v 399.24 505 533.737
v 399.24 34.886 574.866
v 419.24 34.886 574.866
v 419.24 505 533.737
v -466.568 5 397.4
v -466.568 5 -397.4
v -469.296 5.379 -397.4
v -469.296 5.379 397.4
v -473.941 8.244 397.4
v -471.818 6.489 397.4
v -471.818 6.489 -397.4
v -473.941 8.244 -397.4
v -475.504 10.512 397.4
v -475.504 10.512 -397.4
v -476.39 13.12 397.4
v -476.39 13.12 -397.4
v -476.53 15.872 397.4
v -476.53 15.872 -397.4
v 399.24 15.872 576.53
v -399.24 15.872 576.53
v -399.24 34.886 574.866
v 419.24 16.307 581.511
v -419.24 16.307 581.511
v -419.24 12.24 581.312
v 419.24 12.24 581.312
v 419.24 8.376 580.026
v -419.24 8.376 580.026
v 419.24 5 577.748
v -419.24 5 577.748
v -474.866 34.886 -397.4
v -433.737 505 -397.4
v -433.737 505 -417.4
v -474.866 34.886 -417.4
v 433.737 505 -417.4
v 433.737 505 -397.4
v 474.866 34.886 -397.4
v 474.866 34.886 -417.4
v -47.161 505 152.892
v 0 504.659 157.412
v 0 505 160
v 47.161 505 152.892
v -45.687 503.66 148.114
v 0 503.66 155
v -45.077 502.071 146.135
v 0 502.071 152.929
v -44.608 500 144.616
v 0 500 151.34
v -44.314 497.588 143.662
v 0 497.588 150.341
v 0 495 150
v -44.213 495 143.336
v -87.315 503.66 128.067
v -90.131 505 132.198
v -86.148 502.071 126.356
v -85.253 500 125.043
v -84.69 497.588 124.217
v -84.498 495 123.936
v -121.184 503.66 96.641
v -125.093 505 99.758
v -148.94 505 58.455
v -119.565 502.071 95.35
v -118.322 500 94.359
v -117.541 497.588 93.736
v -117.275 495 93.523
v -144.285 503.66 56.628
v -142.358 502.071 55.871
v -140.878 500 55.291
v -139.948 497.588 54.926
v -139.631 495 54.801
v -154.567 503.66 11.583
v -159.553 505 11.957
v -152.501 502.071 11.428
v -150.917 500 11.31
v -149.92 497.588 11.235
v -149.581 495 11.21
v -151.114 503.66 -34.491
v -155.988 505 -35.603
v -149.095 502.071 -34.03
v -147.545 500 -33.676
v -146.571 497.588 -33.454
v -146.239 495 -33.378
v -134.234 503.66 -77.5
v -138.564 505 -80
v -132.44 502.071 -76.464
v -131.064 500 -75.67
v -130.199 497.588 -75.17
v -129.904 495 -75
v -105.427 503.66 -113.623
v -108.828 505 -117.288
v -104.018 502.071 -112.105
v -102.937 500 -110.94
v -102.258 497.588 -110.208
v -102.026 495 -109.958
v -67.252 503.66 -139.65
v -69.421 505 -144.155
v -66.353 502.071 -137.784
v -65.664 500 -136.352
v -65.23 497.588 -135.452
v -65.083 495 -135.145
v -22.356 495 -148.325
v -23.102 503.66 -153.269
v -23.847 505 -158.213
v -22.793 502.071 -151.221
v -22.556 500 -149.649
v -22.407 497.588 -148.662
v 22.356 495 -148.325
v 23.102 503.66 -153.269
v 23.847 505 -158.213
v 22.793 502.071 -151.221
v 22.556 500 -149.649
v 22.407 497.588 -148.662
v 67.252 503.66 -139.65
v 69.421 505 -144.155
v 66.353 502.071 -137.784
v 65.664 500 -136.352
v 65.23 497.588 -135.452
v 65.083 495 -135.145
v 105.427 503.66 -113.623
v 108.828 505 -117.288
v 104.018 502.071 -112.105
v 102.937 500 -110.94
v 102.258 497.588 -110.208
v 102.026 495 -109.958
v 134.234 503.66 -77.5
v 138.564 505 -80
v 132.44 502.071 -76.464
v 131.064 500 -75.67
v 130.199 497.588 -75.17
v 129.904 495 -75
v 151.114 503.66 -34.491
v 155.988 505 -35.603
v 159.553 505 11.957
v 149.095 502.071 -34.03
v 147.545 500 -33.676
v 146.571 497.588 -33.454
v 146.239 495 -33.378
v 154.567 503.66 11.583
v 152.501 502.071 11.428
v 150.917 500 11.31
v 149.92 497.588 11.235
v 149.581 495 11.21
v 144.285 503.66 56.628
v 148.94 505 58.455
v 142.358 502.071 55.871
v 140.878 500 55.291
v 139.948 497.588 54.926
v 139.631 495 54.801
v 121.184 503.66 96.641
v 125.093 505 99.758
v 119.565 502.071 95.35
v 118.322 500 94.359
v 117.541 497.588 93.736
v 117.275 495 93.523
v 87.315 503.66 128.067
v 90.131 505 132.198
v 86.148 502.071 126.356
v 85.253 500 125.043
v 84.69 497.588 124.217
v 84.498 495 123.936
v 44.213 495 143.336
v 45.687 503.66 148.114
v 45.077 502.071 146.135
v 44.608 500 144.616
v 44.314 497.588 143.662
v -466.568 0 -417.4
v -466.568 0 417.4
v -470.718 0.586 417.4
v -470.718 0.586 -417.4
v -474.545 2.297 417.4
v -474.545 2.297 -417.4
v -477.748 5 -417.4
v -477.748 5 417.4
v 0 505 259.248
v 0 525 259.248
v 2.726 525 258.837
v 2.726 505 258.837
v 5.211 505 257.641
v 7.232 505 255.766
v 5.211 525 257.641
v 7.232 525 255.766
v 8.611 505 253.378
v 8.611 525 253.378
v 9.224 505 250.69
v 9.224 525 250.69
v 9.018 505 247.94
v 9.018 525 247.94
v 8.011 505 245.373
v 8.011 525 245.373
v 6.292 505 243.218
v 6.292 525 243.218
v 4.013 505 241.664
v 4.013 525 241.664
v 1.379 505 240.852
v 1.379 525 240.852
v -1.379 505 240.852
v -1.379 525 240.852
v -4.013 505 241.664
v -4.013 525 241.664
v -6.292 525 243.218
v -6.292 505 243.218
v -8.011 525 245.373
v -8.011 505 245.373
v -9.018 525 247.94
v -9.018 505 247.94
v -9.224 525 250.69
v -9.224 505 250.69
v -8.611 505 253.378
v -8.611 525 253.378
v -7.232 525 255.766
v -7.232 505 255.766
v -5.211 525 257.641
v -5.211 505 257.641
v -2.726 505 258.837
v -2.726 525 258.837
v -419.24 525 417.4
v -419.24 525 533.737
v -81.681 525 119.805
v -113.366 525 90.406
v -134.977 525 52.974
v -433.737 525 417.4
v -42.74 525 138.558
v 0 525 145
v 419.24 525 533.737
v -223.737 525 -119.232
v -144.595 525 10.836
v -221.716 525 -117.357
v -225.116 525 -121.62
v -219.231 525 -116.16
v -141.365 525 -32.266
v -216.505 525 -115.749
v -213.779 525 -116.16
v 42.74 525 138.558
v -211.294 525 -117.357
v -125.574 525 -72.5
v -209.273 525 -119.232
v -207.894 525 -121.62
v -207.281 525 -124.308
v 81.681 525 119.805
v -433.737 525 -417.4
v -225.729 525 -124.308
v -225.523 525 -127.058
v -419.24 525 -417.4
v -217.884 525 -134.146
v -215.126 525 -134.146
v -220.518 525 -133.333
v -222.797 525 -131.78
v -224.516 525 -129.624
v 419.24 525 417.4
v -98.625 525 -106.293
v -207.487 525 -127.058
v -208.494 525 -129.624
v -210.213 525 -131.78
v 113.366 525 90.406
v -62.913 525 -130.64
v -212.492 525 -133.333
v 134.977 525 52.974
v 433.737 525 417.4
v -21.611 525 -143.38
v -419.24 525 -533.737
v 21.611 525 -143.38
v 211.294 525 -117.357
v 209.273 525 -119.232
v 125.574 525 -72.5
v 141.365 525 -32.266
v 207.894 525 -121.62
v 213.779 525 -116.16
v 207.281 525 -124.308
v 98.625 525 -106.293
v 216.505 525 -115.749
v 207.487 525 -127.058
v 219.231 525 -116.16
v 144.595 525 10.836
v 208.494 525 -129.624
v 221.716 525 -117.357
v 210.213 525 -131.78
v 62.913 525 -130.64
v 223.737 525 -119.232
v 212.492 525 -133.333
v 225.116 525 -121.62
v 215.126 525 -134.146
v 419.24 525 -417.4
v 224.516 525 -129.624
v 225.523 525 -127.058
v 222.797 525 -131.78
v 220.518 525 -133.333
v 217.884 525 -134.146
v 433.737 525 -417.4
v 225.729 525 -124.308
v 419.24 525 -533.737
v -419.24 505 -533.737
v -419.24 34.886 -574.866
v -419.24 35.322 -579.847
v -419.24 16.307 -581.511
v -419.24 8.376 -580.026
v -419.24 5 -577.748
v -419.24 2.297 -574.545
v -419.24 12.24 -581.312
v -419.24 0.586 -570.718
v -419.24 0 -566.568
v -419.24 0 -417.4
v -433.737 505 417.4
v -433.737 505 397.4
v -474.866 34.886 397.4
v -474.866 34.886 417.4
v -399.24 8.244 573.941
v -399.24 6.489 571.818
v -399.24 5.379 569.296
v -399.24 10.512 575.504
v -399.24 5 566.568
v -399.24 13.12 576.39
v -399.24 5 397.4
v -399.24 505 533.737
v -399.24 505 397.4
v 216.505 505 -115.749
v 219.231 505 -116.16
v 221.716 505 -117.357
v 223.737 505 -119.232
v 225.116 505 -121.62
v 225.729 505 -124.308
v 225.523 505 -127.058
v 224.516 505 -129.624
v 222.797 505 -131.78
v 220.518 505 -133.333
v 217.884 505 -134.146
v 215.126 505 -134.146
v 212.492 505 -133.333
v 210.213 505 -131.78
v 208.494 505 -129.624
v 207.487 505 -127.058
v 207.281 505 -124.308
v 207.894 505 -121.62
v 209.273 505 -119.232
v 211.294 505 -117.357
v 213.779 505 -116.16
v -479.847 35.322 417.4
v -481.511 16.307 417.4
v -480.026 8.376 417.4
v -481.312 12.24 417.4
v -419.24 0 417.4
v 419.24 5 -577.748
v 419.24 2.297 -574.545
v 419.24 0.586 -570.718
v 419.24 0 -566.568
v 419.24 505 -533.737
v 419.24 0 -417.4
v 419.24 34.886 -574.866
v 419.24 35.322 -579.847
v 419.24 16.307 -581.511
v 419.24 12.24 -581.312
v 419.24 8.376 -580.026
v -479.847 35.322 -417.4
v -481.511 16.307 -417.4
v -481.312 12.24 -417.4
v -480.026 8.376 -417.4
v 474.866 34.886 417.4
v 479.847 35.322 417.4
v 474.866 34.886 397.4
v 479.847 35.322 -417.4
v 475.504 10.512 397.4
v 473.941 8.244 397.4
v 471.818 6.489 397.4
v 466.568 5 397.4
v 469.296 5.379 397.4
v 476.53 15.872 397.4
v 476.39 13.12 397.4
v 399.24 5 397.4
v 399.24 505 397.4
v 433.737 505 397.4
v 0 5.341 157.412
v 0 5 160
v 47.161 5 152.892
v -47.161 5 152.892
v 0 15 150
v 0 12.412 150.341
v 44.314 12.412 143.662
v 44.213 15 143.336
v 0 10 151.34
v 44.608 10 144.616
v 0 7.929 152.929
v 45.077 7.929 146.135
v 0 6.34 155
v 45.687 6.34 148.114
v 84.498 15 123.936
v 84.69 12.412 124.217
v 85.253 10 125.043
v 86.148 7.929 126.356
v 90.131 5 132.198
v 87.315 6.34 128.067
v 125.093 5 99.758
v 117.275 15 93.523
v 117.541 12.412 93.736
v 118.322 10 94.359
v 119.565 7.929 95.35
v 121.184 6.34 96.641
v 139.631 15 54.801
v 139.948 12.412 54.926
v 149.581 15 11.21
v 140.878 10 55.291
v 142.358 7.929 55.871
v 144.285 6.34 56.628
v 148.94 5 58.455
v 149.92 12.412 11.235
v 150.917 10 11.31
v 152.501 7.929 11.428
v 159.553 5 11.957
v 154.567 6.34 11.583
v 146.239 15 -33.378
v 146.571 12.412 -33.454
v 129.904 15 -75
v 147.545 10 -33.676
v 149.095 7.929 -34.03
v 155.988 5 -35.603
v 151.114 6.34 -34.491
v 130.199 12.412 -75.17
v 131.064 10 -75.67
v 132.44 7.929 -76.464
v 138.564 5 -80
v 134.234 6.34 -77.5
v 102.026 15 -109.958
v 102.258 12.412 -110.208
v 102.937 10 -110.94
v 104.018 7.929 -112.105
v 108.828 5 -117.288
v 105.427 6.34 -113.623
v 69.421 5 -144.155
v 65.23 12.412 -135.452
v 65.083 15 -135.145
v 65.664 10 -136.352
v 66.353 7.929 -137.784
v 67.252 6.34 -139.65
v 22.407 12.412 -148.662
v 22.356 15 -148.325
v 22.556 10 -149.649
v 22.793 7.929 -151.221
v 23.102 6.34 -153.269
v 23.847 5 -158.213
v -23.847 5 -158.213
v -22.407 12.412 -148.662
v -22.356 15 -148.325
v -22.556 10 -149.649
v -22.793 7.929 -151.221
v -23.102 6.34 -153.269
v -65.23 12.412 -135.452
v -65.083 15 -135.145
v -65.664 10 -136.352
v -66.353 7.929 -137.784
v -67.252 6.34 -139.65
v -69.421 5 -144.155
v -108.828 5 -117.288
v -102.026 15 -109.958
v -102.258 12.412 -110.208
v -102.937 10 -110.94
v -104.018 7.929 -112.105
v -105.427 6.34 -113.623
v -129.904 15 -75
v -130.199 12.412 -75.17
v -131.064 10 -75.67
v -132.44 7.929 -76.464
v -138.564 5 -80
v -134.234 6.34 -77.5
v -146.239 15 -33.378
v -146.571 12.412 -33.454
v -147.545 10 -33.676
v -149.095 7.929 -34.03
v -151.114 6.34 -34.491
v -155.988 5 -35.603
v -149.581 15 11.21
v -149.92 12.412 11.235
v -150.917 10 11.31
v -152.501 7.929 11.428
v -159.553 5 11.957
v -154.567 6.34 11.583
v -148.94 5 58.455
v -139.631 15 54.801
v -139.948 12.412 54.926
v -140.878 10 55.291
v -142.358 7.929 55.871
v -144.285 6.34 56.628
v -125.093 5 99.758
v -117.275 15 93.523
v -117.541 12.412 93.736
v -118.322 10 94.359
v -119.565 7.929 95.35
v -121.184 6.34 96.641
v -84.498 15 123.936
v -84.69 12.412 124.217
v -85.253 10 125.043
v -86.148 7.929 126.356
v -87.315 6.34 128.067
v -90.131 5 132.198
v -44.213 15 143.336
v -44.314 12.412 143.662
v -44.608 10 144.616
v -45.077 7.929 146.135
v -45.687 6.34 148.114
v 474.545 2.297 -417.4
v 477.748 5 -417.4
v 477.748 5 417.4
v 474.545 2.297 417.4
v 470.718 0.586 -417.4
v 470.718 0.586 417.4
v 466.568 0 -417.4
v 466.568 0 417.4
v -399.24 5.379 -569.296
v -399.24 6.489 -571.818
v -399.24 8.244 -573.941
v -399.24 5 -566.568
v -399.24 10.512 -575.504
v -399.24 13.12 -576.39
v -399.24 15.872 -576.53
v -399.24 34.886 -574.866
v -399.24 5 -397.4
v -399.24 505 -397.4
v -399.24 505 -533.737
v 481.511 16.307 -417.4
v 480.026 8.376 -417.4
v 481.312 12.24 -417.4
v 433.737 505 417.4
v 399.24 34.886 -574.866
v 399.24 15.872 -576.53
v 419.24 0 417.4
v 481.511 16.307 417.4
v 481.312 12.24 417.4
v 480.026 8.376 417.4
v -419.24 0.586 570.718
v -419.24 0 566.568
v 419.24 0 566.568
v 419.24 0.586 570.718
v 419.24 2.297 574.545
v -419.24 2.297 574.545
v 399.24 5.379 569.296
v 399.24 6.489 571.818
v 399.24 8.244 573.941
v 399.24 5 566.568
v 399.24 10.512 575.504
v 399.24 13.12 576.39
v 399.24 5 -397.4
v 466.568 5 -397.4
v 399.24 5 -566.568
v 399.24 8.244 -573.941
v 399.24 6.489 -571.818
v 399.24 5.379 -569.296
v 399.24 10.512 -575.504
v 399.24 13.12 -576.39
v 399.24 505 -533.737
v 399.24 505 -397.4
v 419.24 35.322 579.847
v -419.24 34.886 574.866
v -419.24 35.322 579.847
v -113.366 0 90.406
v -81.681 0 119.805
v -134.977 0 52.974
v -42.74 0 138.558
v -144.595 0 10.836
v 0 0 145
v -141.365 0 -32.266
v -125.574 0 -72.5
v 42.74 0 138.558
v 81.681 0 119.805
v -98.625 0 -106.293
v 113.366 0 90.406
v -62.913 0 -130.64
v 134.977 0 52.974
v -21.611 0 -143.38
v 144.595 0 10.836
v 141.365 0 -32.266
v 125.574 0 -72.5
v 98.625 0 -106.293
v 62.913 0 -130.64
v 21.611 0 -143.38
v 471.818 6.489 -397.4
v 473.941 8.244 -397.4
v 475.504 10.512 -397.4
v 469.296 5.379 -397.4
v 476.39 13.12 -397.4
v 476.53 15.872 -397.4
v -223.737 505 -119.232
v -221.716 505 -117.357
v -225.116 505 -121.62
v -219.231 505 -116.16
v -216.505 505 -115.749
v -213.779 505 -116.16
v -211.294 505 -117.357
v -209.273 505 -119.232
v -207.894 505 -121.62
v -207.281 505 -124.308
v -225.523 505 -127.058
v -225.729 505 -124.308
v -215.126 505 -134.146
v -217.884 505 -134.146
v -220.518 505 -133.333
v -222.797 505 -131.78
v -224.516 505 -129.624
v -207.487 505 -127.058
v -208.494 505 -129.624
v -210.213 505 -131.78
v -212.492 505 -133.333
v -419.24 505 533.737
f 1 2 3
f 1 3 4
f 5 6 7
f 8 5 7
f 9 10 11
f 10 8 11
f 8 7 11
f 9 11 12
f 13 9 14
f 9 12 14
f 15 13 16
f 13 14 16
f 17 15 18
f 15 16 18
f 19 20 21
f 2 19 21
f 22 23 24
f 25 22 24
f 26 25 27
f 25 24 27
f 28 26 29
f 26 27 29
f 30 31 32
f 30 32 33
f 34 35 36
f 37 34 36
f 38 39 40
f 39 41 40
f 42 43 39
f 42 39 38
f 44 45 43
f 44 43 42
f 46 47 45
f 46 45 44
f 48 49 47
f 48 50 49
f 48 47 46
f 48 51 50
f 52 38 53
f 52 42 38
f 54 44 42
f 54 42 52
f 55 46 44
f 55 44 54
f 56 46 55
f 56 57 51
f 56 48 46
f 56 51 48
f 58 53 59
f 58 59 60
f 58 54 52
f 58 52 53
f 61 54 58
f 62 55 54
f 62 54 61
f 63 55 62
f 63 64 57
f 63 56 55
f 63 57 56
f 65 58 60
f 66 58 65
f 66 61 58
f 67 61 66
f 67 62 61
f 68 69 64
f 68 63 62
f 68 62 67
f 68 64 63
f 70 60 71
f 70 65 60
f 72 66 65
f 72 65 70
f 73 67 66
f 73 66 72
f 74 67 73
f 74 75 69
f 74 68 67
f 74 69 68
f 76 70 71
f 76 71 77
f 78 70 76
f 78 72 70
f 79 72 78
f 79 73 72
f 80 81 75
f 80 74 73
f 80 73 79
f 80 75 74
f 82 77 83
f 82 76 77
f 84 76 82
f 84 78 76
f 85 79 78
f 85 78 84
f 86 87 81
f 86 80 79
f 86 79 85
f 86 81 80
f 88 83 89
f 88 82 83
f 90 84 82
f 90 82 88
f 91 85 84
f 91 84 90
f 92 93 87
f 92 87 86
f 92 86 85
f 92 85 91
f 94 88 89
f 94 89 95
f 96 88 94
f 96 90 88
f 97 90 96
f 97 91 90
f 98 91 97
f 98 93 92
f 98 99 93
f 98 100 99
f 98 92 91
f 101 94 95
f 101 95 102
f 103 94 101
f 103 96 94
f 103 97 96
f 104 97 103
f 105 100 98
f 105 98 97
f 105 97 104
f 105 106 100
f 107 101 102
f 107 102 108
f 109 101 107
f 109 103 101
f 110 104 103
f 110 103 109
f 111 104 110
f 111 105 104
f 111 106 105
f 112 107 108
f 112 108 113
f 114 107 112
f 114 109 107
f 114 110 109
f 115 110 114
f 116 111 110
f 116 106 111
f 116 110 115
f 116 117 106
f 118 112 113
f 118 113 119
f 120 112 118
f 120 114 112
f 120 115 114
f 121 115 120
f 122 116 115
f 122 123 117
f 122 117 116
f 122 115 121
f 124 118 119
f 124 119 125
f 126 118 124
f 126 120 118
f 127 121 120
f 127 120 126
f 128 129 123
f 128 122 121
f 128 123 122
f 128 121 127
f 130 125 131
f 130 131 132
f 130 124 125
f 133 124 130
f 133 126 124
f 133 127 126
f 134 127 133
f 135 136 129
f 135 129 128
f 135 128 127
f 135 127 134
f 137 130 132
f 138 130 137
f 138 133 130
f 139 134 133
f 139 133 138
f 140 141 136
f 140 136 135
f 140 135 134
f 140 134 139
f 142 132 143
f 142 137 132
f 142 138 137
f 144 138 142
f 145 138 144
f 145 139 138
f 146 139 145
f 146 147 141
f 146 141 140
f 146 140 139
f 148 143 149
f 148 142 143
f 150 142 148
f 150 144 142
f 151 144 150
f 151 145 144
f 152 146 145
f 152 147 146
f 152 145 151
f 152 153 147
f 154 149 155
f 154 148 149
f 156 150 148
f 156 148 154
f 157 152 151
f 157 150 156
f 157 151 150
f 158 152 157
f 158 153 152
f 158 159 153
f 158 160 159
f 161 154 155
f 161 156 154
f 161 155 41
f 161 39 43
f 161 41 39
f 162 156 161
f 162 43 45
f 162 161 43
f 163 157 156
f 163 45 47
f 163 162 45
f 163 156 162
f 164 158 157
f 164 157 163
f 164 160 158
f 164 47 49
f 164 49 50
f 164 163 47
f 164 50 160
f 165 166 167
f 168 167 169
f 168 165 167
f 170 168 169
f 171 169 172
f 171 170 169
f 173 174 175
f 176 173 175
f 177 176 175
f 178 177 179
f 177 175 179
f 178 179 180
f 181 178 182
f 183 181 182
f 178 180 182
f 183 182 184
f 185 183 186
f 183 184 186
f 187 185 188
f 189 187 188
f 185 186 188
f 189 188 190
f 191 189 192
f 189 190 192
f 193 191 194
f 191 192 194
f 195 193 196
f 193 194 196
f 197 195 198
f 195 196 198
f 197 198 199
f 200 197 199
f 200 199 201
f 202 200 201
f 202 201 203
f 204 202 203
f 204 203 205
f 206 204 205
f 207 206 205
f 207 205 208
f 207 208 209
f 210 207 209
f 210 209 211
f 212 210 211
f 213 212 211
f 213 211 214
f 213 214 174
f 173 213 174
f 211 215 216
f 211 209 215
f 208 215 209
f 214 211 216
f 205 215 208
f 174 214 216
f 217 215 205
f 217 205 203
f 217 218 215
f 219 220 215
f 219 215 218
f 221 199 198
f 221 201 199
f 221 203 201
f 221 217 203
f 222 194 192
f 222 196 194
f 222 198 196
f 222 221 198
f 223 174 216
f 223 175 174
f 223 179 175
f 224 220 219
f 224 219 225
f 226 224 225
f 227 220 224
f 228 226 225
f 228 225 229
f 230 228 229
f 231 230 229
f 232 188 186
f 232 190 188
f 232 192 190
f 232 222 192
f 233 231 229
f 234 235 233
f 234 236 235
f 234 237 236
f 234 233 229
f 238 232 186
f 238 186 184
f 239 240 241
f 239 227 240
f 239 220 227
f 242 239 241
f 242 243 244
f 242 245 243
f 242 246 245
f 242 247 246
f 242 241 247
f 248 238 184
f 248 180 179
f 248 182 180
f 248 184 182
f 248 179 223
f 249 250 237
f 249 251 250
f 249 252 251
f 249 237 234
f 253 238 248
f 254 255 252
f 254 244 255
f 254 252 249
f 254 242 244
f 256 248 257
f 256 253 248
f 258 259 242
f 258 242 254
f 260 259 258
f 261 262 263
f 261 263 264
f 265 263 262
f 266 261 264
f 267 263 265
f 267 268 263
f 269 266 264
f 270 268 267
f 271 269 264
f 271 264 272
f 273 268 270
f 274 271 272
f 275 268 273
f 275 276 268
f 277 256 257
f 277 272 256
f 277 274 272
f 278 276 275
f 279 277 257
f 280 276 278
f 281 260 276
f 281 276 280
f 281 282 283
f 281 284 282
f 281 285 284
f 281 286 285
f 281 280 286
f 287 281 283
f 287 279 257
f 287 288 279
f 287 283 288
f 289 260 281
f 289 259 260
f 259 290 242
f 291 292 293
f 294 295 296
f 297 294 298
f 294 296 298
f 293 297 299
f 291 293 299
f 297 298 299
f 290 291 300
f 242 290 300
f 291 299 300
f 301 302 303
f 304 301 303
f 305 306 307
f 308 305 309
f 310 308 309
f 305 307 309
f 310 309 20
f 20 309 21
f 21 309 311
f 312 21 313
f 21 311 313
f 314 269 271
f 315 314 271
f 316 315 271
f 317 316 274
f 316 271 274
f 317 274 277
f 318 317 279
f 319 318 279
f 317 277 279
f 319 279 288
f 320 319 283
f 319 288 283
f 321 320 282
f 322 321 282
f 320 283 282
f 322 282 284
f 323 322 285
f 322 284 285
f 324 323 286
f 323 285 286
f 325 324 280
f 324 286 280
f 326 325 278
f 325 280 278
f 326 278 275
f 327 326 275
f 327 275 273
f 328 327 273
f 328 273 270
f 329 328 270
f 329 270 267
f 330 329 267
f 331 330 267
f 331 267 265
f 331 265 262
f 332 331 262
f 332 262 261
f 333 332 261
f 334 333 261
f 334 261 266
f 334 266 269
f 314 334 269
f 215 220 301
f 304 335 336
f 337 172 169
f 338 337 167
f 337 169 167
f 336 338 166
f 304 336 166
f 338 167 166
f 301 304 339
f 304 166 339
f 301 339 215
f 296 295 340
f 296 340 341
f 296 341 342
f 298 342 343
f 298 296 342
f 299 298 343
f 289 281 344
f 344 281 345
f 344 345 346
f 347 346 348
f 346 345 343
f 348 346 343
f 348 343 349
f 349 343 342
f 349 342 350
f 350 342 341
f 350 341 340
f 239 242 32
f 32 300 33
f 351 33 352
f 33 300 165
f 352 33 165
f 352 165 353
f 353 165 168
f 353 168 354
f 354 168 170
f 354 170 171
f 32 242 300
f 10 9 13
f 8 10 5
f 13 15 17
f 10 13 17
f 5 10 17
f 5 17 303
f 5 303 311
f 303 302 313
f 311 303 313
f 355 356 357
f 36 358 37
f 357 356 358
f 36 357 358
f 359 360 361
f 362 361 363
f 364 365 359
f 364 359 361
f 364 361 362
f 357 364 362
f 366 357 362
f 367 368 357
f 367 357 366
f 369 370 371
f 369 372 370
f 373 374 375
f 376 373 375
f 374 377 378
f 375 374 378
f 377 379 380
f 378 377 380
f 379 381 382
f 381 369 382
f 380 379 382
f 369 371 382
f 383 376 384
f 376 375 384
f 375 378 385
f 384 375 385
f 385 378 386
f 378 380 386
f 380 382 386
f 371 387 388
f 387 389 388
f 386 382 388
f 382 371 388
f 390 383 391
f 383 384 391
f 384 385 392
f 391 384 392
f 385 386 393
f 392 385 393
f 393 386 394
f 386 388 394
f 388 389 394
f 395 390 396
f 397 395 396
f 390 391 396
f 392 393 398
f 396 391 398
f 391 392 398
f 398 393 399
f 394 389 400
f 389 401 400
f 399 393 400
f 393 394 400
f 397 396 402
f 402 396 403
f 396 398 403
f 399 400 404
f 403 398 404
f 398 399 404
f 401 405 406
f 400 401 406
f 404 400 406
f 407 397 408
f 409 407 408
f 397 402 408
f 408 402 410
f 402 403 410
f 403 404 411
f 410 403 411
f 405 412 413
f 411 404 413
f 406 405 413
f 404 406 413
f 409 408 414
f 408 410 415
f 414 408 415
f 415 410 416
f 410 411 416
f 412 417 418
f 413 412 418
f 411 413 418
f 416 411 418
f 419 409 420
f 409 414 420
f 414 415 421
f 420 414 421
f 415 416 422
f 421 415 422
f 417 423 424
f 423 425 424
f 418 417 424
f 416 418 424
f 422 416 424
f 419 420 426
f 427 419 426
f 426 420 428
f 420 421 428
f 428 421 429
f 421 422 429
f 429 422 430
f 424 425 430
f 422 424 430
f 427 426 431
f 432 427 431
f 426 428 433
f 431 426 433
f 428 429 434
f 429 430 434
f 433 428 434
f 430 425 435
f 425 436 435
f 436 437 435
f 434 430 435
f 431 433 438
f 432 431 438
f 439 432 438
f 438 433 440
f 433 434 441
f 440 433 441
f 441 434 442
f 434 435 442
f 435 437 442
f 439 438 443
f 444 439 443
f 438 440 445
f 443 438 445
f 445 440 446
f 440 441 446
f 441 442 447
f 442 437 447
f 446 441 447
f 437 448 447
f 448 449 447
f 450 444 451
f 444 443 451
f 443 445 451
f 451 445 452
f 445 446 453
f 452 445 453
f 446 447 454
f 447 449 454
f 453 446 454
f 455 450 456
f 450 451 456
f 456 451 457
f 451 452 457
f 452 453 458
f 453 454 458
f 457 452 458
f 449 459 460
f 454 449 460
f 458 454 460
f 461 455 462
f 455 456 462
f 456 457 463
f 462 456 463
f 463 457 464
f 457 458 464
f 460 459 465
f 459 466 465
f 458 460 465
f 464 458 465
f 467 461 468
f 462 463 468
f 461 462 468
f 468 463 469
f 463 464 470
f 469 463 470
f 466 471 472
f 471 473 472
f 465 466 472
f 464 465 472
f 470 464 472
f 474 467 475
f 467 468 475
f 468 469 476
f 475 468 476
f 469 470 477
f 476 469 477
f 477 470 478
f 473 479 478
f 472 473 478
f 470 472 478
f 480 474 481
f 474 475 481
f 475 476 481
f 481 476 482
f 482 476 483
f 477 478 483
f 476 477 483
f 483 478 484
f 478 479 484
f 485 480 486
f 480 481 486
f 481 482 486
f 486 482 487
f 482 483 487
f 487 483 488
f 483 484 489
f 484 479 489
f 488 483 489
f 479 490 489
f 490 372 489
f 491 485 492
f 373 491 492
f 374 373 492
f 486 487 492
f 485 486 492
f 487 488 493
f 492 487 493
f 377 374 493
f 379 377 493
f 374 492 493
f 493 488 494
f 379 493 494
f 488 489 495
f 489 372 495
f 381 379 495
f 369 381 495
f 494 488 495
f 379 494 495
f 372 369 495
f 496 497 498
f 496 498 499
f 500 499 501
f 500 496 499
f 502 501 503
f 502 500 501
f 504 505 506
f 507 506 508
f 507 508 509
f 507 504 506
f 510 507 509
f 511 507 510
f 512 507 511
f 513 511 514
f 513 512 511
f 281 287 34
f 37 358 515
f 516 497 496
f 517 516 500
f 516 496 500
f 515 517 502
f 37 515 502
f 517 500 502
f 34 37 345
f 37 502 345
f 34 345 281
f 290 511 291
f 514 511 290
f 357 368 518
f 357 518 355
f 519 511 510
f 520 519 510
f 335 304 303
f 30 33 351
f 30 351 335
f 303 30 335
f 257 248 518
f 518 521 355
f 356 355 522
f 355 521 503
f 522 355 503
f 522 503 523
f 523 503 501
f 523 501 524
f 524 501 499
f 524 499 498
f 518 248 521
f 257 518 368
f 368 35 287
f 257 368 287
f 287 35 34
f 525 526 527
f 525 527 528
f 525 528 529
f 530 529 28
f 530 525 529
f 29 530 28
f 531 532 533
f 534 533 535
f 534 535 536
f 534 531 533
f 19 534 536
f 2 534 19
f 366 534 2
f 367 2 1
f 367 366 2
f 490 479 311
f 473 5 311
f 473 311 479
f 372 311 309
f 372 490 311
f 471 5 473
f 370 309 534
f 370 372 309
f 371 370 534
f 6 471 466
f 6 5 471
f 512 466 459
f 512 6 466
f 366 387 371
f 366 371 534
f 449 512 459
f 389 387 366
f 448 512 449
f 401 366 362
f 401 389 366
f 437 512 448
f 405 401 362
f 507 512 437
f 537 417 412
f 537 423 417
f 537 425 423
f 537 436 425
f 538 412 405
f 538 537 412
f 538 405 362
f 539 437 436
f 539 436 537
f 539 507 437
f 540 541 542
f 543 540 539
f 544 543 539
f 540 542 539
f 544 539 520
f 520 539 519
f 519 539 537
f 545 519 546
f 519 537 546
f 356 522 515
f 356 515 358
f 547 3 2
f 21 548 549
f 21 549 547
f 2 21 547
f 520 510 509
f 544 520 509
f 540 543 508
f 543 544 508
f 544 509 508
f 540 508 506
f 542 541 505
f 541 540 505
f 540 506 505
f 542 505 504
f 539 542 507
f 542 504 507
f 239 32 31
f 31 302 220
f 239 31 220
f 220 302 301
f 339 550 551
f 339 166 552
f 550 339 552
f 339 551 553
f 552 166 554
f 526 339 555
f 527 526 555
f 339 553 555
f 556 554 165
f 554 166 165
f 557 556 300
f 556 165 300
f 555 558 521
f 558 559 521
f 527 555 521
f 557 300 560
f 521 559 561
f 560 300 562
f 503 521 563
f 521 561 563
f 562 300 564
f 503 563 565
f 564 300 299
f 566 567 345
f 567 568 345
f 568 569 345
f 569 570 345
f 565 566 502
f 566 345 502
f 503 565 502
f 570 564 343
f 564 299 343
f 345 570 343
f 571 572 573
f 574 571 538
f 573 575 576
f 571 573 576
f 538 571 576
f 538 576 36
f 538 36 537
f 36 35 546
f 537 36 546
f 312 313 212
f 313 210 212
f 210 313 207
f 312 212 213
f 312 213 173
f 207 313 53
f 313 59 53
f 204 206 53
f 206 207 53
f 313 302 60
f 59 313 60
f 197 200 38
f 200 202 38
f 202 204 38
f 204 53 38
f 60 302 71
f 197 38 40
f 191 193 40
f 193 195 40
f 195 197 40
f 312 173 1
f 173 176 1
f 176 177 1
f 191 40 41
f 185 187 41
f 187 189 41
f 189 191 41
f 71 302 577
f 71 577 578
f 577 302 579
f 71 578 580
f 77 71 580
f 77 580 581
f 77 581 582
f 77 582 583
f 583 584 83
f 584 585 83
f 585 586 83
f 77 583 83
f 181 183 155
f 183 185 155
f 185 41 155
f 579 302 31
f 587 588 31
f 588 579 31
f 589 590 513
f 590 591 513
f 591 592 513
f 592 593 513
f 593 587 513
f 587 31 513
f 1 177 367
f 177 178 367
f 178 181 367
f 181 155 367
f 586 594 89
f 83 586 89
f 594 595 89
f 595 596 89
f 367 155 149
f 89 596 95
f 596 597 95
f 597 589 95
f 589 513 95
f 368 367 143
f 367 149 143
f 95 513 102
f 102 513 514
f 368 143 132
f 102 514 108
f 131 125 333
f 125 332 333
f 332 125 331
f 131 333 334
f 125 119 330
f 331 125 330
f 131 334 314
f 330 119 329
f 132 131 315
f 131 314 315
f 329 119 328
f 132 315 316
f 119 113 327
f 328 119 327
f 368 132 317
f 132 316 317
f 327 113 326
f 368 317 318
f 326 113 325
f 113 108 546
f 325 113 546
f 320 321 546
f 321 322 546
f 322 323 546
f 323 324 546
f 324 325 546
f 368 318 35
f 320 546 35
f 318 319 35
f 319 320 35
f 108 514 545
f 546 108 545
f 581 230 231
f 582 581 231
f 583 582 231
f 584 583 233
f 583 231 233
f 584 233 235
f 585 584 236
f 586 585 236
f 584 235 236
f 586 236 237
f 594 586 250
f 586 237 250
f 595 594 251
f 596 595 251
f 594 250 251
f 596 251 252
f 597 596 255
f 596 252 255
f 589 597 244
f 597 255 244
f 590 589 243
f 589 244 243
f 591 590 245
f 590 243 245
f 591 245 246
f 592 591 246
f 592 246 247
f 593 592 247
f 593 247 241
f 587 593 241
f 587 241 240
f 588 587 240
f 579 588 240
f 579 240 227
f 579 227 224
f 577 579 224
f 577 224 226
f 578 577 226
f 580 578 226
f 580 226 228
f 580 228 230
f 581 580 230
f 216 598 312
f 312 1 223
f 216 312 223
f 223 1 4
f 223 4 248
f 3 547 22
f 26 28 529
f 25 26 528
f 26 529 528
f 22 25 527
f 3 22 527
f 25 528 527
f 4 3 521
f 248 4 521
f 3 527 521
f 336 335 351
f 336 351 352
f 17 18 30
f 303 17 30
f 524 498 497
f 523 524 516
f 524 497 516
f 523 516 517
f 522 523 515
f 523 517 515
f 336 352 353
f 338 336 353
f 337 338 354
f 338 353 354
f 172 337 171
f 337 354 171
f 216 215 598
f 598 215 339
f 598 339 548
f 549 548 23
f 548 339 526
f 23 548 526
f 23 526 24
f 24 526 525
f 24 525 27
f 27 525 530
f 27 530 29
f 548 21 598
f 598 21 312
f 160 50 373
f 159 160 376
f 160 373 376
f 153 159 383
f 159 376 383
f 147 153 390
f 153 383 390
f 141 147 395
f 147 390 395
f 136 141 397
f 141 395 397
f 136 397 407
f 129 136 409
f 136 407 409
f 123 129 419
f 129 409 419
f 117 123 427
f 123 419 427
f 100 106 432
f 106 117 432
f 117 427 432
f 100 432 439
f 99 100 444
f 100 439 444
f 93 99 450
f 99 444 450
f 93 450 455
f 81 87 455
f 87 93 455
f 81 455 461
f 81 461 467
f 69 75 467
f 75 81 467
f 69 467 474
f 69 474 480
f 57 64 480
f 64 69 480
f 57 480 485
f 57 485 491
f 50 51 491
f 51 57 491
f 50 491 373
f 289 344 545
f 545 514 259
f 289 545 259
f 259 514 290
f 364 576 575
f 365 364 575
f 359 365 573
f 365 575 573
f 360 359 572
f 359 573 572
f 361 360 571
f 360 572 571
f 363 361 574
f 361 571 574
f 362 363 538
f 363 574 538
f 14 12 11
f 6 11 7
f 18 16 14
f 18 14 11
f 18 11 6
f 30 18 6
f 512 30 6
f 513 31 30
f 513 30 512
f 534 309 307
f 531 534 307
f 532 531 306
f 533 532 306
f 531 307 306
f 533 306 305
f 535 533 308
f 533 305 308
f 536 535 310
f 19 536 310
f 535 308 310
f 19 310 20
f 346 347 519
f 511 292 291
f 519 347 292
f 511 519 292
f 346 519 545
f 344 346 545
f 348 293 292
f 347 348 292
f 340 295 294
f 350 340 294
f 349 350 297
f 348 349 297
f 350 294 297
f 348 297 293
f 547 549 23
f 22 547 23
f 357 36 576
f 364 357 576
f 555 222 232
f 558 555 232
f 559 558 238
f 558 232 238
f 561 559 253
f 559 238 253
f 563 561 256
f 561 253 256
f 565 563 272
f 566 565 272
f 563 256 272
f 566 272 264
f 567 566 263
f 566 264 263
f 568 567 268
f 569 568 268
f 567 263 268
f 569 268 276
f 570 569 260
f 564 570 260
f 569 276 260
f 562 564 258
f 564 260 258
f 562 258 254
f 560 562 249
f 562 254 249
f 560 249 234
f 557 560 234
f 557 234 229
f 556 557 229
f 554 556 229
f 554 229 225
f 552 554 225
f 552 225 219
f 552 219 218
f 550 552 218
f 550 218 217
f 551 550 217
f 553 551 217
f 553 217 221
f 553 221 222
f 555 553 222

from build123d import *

# Parameters (mm, degrees)
BOSS_EXTRUDE1_DEPTH  = 5
EDGE_FLANGE1_START   = -417.4
EDGE_FLANGE1_DEPTH   = 834.8
EDGE_FLANGE1_START_2 = -419.24
EDGE_FLANGE1_2_DEPTH = 838.48
EDGE_FLANGE1_3_DEPTH = 834.8
EDGE_FLANGE1_4_DEPTH = 838.48
BOSS_EXTRUDE2_START  = -20
BOSS_EXTRUDE2_DEPTH  = 20
BOSS_EXTRUDE6_START  = -20
BOSS_EXTRUDE6_DEPTH  = 20
MIRROR2_START        = -20
MIRROR2_COPY_1_DEPTH = 20
MIRROR2_COPY_2_DEPTH = 20
BOSS_EXTRUDE7_DEPTH  = 20
CUT_EXTRUDE1_REACH   = 921.649
SKETCH21_R           = 9.25
BOSS_EXTRUDE8_REACH  = 918.804
SKETCH22_R           = 150
SKETCH23_R           = 145
CUT_EXTRUDE2_DEPTH   = 920.648675088
FILLET1_R            = 10


# Read off the part's stored shape, not the designer's step: Edge-Flange1
with BuildPart() as part:
    # Sketch1 → Boss-Extrude1 (new body)
    with BuildSketch(Plane(origin=(0, 0, 0), x_dir=(1, 0, 0), z_dir=(0, 1, 0))):
        Polygon((-419.24, -417.4), (-419.24, -582.5), (419.24, -582.5), (419.24, -417.4), (482.5, -417.4), (482.5, 417.4), (419.24, 417.4), (419.24, 582.5), (-419.24, 582.5), (-419.24, 417.4), (-482.5, 417.4), (-482.5, -417.4), align=None)
    extrude(amount=BOSS_EXTRUDE1_DEPTH)

    # Edge-Flange1 outline → Edge-Flange1 (add)
    with BuildSketch(Plane.XY.offset(EDGE_FLANGE1_START)):
        with BuildLine():
            Line((-479.84720202, 35.321619656), (-481.510736273, 16.307336141))
            ThreePointArc((-481.510736273, 16.307336141), (-480.800529715, 10.26398325), (-477.748155652, 4.999999958))
            Line((-477.748155652, 4.999999958), (-466.567815802, 5))
            ThreePointArc((-466.567815802, 5), (-473.94058917, 8.244097924), (-476.529762783, 15.871557427))
            Line((-476.529762783, 15.871557427), (-474.86622853, 34.885840943))
            Line((-474.86622853, 34.885840943), (-479.84720202, 35.321619656))
        make_face()
        with BuildLine():
            ThreePointArc((476.529762783, 15.871557427), (473.94058917, 8.244097924), (466.567815802, 5))
            Line((466.567815802, 5), (477.748155652, 4.999999958))
            ThreePointArc((477.748155652, 4.999999958), (480.800529715, 10.26398325), (481.510736273, 16.307336141))
            Line((481.510736273, 16.307336141), (479.84720202, 35.321619656))
            Line((479.84720202, 35.321619656), (474.86622853, 34.885840943))
            Line((474.86622853, 34.885840943), (476.529762783, 15.871557427))
        make_face()
    extrude(amount=EDGE_FLANGE1_DEPTH)

    # Edge-Flange1 2 outline → Edge-Flange1 2 (add)
    with BuildSketch(Plane.YZ.offset(EDGE_FLANGE1_START_2)):
        with BuildLine():
            Line((35.321619656, 579.84720202), (16.307336141, 581.510736273))
            ThreePointArc((16.307336141, 581.510736273), (10.263983245, 580.800529713), (4.99999995, 577.748155645))
            Line((4.99999995, 577.748155645), (5, 566.567815802))
            ThreePointArc((5, 566.567815802), (8.244097924, 573.94058917), (15.871557427, 576.529762783))
            Line((15.871557427, 576.529762783), (34.885840943, 574.86622853))
            Line((34.885840943, 574.86622853), (35.321619656, 579.84720202))
        make_face()
        with BuildLine():
            ThreePointArc((15.871557427, -576.529762783), (8.244097924, -573.94058917), (5, -566.567815802))
            Line((5, -566.567815802), (4.99999995, -577.748155645))
            ThreePointArc((4.99999995, -577.748155645), (10.263983245, -580.800529713), (16.307336141, -581.510736273))
            Line((16.307336141, -581.510736273), (35.321619656, -579.84720202))
            Line((35.321619656, -579.84720202), (34.885840943, -574.86622853))
            Line((34.885840943, -574.86622853), (15.871557427, -576.529762783))
        make_face()
    extrude(amount=EDGE_FLANGE1_2_DEPTH)

    # Edge-Flange1 3 outline → Edge-Flange1 3 (cut)
    with BuildSketch(Plane.XY.offset(EDGE_FLANGE1_START)):
        with BuildLine():
            ThreePointArc((-466.567815802, 0), (-472.691540133, 1.306936051), (-477.748155652, 4.999999958))
            Line((-477.748155652, 4.999999958), (-483, 4.999999958))
            Line((-483, 4.999999958), (-483, -2.2e-08))
            Line((-483, -2.2e-08), (-466.567815802, 0))
        make_face()
        with BuildLine():
            ThreePointArc((477.748155652, 4.999999958), (472.691540133, 1.306936051), (466.567815802, 0))
            Line((466.567815802, 0), (483, -2.2e-08))
            Line((483, -2.2e-08), (483, 4.999999958))
            Line((483, 4.999999958), (477.748155652, 4.999999958))
        make_face()
    extrude(amount=EDGE_FLANGE1_3_DEPTH, mode=Mode.SUBTRACT)

    # Edge-Flange1 4 outline → Edge-Flange1 4 (cut)
    with BuildSketch(Plane.YZ.offset(EDGE_FLANGE1_START_2)):
        with BuildLine():
            ThreePointArc((0, 566.567815802), (1.306936049, 572.691540128), (4.99999995, 577.748155645))
            Line((4.99999995, 577.748155645), (4.99999995, 583))
            Line((4.99999995, 583), (-2.7e-08, 583))
            Line((-2.7e-08, 583), (0, 566.567815802))
        make_face()
        with BuildLine():
            ThreePointArc((4.99999995, -577.748155645), (1.306936049, -572.691540128), (0, -566.567815802))
            Line((0, -566.567815802), (-2.7e-08, -583))
            Line((-2.7e-08, -583), (4.99999995, -583))
            Line((4.99999995, -583), (4.99999995, -577.748155645))
        make_face()
    extrude(amount=EDGE_FLANGE1_4_DEPTH, mode=Mode.SUBTRACT)

    # Sketch18 → Boss-Extrude2 (add)
    with BuildSketch(Plane(origin=(419.24, 0, 0), x_dir=(0, 0, -1), z_dir=(1, 0, 0)).offset(BOSS_EXTRUDE2_START)):
        with BuildLine():
            Line((-417.4, 5), (-566.567815802, 5))
            ThreePointArc((-566.567815802, 5), (-573.94058917, 8.244097924), (-576.529762783, 15.871557427))
            Line((-576.529762783, 15.871557427), (-533.736569049, 505))
            Line((-533.736569049, 505), (-417.4, 505))
            Line((-417.4, 505), (-417.4, 5))
        make_face()
    boss_extrude2 = extrude(amount=BOSS_EXTRUDE2_DEPTH)

    # Sketch19 → Boss-Extrude6 (add)
    with BuildSketch(Plane.XY.offset(417.4).offset(BOSS_EXTRUDE6_START)):
        with BuildLine():
            Line((466.567815802, 5), (419.24, 5))
            Line((419.24, 5), (399.24, 5))
            Line((399.24, 5), (399.24, 505))
            Line((399.24, 505), (419.24, 505))
            Line((419.24, 505), (433.736569049, 505))
            Line((433.736569049, 505), (476.529762783, 15.871557427))
            ThreePointArc((476.529762783, 15.871557427), (473.94058917, 8.244097924), (466.567815802, 5))
        make_face()
    boss_extrude6 = extrude(amount=BOSS_EXTRUDE6_DEPTH)

    # Mirror1: Boss-Extrude2, Boss-Extrude6 across plane
    add(boss_extrude2.mirror(Plane.XY))
    add(boss_extrude6.mirror(Plane.XY))

    # Mirror2: Boss-Extrude2, Boss-Extrude6 across plane
    add(boss_extrude2.mirror(Plane(origin=(0, 0, 0), x_dir=(0, 0, 1), z_dir=(1, 0, 0))))
    add(boss_extrude6.mirror(Plane(origin=(0, 0, 0), x_dir=(0, 0, 1), z_dir=(1, 0, 0))))

    # Mirror2 copy 1 sketch → Mirror2 copy 1 (add)
    with BuildSketch(Plane.ZY.offset(419.24).offset(MIRROR2_START)):
        with BuildLine():
            Line((-417.4, 5), (-566.567815802, 5))
            ThreePointArc((-566.567815802, 5), (-573.94058917, 8.244097924), (-576.529762783, 15.871557427))
            Line((-576.529762783, 15.871557427), (-533.736569049, 505))
            Line((-533.736569049, 505), (-417.4, 505))
            Line((-417.4, 505), (-417.4, 5))
        make_face()
    extrude(amount=MIRROR2_COPY_1_DEPTH)

    # Mirror2 copy 2 sketch → Mirror2 copy 2 (add)
    with BuildSketch(Plane(origin=(0, 0, -417.4), x_dir=(-1, 0, 0), z_dir=(0, 0, -1)).offset(MIRROR2_START)):
        with BuildLine():
            Line((466.567815802, 5), (419.24, 5))
            Line((419.24, 5), (399.24, 5))
            Line((399.24, 5), (399.24, 505))
            Line((399.24, 505), (419.24, 505))
            Line((419.24, 505), (433.736569049, 505))
            Line((433.736569049, 505), (476.529762783, 15.871557427))
            ThreePointArc((476.529762783, 15.871557427), (473.94058917, 8.244097924), (466.567815802, 5))
        make_face()
    extrude(amount=MIRROR2_COPY_2_DEPTH)

    # Sketch20 → Boss-Extrude7 (add)
    with BuildSketch(Plane(origin=(0, 505, 0), x_dir=(1, 0, 0), z_dir=(0, 1, 0))):
        Polygon((-419.24, -417.4), (-419.24, -533.736569049), (419.24, -533.736569049), (419.24, -417.4), (433.736569049, -417.4), (433.736569049, 417.4), (419.24, 417.4), (419.24, 533.736569049), (-419.24, 533.736569049), (-419.24, 417.4), (-433.736569049, 417.4), (-433.736569049, -417.4), align=None)
    extrude(amount=BOSS_EXTRUDE7_DEPTH)

    # Sketch21 → Cut-Extrude1 (cut, up to next)
    with BuildSketch(Plane(origin=(0, 525, 0), x_dir=(1, 0, 0), z_dir=(0, 1, 0)), mode=Mode.PRIVATE) as cut_extrude1_sk1:
        with Locations(Location((0, -249.998440062, 0), (0, 0, 270))):
            Circle(SKETCH21_R)
    cut_extrude1_tool1 = extrude(cut_extrude1_sk1.sketch, amount=-CUT_EXTRUDE1_REACH, mode=Mode.PRIVATE) & part.part
    # Sketch21 → Cut-Extrude1 (cut, up to next)
    with BuildSketch(Plane(origin=(0, 525, 0), x_dir=(1, 0, 0), z_dir=(0, 1, 0)), mode=Mode.PRIVATE) as cut_extrude1_sk2:
        with Locations(Location((-216.505, 124.999220031, 0), (0, 0, 270))):
            Circle(SKETCH21_R)
    cut_extrude1_tool2 = extrude(cut_extrude1_sk2.sketch, amount=-CUT_EXTRUDE1_REACH, mode=Mode.PRIVATE) & part.part
    # Sketch21 → Cut-Extrude1 (cut, up to next)
    with BuildSketch(Plane(origin=(0, 525, 0), x_dir=(1, 0, 0), z_dir=(0, 1, 0)), mode=Mode.PRIVATE) as cut_extrude1_sk3:
        with Locations(Location((216.505, 124.999220031, 0), (0, 0, 270))):
            Circle(SKETCH21_R)
    cut_extrude1_tool3 = extrude(cut_extrude1_sk3.sketch, amount=-CUT_EXTRUDE1_REACH, mode=Mode.PRIVATE) & part.part
    add(cut_extrude1_tool1.solids().sort_by_distance((0, 525, 249.99844))[0], mode=Mode.SUBTRACT)
    add(cut_extrude1_tool2.solids().sort_by_distance((-216.505, 525, -124.99922))[0], mode=Mode.SUBTRACT)
    add(cut_extrude1_tool3.solids().sort_by_distance((216.505, 525, -124.99922))[0], mode=Mode.SUBTRACT)

    # Sketch22 → Boss-Extrude8 (add, up to next)
    with BuildSketch(Plane(origin=(0, 5, 0), x_dir=(1, 0, 0), z_dir=(0, 1, 0)), mode=Mode.PRIVATE) as boss_extrude8_sk1:
        with Locations(Location((0, 0, 0), (0, 0, 270))):
            Circle(SKETCH22_R)
    boss_extrude8_tool1 = extrude(boss_extrude8_sk1.sketch, amount=BOSS_EXTRUDE8_REACH, mode=Mode.PRIVATE) - part.part
    add(boss_extrude8_tool1.solids().sort_by_distance((0, 5, 0))[0])

    # Sketch23 → Cut-Extrude2 (cut, through all)
    with BuildSketch(Plane(origin=(0, 525, 0), x_dir=(1, 0, 0), z_dir=(0, 1, 0))):
        with Locations(Location((0, 0, 0), (0, 0, 270))):
            Circle(SKETCH23_R)
    extrude(amount=-CUT_EXTRUDE2_DEPTH, mode=Mode.SUBTRACT)

    # Fillet1
    fillet1_edges = [part.edges().sort_by_distance(p)[0] for p in [
        (0, 505, -150),
        (0, 5, -150),
    ]]
    fillet(fillet1_edges, radius=FILLET1_R)


solid = part.part
